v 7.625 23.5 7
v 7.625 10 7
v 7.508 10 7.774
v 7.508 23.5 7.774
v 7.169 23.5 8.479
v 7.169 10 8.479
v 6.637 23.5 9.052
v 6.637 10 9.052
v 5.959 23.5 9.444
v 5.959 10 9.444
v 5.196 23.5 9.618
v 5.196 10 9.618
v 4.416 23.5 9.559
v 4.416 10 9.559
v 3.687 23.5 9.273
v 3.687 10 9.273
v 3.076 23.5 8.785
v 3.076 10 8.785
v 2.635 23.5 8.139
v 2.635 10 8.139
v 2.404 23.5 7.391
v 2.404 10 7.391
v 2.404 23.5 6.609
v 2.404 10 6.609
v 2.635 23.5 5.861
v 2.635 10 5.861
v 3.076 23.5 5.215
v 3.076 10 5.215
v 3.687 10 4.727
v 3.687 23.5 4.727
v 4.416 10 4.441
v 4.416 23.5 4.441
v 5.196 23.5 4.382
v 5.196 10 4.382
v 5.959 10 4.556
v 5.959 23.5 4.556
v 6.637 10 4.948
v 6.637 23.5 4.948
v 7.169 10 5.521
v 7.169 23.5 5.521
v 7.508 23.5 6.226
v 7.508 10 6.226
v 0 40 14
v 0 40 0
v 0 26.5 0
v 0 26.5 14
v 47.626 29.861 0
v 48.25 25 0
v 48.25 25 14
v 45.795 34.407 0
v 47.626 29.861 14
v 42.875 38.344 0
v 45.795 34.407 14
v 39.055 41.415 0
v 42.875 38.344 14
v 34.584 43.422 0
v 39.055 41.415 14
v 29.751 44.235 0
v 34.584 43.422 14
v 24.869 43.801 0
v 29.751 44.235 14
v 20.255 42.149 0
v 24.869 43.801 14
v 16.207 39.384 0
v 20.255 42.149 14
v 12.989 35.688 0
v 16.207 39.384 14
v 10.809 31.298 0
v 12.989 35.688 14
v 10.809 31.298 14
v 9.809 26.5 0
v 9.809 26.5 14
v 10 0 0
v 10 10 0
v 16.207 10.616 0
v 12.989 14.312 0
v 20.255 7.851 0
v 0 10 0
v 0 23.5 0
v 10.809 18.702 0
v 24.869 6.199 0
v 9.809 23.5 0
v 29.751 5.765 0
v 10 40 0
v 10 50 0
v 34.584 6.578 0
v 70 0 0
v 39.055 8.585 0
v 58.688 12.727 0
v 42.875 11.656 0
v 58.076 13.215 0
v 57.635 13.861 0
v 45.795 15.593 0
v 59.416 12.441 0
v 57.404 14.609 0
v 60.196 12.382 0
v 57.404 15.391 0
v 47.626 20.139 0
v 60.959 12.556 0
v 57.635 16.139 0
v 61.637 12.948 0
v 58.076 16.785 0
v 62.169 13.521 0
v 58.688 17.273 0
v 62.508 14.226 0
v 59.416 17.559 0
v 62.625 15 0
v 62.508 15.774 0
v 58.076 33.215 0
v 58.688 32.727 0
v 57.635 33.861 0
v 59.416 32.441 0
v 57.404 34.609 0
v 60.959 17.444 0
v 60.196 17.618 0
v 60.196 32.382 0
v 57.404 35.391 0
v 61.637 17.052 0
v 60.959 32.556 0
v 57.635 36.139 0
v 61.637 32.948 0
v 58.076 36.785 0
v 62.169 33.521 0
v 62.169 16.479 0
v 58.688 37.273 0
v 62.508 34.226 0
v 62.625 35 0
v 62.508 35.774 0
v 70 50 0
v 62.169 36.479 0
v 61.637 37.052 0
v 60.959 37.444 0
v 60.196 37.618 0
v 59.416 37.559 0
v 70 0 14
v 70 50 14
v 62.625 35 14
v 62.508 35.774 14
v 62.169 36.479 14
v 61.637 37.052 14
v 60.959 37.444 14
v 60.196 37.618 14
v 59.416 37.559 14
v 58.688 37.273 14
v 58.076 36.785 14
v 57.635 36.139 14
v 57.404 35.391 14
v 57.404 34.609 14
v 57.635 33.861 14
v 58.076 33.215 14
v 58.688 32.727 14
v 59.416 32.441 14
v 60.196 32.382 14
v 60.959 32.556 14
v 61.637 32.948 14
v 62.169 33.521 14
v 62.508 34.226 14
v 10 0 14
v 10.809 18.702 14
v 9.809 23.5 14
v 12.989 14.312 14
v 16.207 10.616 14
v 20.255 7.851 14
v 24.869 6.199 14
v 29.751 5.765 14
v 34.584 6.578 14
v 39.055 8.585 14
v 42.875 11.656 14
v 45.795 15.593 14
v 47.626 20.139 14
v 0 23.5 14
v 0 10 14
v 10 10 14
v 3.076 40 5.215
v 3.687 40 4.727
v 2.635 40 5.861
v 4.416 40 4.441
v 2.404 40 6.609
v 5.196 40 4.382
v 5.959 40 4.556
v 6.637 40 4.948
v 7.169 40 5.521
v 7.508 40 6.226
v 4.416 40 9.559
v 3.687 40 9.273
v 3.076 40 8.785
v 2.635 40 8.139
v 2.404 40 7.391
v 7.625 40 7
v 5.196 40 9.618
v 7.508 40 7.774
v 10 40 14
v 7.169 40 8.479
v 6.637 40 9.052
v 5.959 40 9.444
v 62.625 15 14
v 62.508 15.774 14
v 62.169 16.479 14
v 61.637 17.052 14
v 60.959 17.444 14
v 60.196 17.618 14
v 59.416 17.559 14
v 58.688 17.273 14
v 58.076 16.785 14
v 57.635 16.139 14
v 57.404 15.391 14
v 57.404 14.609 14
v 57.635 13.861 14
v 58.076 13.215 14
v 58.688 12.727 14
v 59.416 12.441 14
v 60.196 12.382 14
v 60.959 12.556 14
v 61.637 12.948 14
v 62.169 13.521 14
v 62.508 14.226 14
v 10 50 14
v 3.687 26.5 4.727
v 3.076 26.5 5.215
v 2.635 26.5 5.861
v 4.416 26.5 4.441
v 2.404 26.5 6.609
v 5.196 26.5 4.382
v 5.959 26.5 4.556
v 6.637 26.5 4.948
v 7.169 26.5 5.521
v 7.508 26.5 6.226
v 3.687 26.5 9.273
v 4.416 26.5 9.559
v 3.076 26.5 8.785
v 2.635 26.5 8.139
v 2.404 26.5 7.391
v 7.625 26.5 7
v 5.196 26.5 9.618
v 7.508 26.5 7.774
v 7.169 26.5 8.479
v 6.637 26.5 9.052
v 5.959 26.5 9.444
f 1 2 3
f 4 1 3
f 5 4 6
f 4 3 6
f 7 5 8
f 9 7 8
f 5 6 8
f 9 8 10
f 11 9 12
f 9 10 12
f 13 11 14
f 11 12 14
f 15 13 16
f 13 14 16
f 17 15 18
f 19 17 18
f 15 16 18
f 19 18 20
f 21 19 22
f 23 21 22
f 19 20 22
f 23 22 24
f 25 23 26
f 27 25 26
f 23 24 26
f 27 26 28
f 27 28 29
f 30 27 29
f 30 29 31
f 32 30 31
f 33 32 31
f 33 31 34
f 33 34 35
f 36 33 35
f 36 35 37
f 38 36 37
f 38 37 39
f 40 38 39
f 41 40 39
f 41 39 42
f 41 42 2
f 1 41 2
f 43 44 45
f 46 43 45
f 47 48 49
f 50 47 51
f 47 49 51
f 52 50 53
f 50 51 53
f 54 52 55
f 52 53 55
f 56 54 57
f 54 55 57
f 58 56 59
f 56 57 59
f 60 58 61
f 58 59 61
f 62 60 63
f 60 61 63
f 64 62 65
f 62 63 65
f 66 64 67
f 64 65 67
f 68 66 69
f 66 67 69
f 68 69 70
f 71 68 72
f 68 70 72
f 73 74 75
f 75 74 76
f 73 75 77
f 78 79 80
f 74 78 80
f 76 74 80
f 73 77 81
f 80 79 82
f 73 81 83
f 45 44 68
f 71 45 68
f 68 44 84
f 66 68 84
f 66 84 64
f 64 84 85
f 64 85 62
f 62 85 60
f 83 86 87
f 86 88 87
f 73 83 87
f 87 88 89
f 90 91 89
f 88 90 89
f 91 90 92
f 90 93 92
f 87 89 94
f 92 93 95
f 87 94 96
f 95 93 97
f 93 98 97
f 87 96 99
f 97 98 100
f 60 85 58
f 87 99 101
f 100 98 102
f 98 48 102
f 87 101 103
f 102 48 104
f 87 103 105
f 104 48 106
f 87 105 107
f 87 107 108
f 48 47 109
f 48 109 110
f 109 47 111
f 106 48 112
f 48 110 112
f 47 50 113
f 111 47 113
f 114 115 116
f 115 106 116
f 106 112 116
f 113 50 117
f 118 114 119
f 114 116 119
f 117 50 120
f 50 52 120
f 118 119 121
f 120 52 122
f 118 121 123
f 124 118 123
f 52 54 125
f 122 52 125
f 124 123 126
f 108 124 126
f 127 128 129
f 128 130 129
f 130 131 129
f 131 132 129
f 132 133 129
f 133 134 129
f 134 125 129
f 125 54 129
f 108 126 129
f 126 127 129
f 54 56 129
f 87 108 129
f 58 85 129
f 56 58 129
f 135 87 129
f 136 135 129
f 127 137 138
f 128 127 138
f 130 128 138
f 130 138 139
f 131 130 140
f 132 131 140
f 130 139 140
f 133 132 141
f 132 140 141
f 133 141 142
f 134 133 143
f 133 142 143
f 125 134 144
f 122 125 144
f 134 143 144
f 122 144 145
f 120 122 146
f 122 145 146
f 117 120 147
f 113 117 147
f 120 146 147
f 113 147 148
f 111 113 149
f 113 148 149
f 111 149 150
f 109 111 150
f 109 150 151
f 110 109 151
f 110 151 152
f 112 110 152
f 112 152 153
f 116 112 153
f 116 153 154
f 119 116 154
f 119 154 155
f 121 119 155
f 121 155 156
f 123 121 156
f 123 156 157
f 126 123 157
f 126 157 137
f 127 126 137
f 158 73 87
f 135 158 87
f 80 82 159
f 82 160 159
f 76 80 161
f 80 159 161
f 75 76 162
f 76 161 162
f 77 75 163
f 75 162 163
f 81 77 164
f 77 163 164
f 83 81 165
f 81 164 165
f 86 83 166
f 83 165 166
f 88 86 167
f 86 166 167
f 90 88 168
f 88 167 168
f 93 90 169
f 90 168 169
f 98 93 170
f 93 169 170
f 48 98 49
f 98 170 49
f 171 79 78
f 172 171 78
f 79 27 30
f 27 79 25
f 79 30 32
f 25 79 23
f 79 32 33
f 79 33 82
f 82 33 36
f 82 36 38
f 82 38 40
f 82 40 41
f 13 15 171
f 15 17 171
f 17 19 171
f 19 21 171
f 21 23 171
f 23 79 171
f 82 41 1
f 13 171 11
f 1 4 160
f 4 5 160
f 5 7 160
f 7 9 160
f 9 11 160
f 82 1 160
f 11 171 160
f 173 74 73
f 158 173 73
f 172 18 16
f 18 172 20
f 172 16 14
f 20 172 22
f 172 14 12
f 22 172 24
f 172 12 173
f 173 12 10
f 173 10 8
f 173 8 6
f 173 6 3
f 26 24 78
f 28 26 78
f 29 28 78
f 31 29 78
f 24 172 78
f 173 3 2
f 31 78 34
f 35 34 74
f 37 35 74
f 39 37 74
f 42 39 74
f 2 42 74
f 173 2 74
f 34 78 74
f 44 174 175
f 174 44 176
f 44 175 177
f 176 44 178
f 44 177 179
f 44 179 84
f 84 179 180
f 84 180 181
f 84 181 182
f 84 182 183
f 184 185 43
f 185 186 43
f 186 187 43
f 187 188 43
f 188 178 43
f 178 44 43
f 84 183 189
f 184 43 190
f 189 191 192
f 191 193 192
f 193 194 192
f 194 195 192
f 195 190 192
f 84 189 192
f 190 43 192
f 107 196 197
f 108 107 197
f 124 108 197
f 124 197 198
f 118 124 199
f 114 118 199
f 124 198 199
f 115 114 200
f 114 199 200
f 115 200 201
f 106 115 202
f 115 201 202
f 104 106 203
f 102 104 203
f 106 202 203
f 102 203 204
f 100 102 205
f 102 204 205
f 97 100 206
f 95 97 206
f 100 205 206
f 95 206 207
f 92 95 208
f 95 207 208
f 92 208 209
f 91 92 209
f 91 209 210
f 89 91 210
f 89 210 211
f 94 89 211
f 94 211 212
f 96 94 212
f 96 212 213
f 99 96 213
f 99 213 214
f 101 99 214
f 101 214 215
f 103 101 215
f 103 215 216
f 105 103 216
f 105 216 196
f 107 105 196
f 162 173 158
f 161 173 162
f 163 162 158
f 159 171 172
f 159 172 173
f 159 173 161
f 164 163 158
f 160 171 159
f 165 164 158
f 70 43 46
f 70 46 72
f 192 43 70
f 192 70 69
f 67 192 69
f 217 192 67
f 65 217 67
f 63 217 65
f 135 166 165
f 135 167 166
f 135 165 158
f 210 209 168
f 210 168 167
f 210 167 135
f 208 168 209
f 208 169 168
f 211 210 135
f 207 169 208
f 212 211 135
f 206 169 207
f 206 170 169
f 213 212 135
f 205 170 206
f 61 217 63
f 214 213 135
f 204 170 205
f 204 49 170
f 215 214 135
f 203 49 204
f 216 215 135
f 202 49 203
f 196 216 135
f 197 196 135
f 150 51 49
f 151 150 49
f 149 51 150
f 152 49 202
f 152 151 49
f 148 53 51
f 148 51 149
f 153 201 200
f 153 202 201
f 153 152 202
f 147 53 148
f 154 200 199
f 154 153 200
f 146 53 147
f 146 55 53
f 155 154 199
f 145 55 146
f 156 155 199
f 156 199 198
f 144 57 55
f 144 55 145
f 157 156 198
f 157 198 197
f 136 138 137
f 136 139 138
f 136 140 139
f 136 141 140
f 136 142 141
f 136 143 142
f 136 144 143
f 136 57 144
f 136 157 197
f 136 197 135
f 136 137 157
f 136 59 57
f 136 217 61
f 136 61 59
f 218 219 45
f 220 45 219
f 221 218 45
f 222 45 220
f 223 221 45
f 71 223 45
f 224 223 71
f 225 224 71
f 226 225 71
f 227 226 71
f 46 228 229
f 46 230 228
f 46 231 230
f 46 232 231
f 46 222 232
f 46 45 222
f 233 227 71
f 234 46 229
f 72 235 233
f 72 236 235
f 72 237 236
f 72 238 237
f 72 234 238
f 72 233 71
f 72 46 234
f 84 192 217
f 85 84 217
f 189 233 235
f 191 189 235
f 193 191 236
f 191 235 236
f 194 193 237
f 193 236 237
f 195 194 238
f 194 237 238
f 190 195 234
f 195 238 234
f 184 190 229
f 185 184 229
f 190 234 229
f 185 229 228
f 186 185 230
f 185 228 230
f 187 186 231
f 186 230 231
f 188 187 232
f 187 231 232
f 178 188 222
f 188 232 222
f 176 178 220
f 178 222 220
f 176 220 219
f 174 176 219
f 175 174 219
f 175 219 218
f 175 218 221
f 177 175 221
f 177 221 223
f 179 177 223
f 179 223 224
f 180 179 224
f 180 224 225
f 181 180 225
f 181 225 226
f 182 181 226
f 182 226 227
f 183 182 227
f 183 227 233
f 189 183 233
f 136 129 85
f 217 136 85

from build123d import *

# Parameters (mm, degrees)
F1_DEPTH = 14
F2_R     = 19.25
F2_R_2   = 2.625
F2_W     = 10
F2_H     = 10
F3_DEPTH = 25
F4_W     = 13.615144
F4_H     = 3
F5_DEPTH = 25
F6_R     = 2.625
F7_DEPTH = 40.001


with BuildPart() as f1:
    # F0 (on Top) → F1 (new body)
    with BuildSketch(Plane.XY):
        Polygon((10, 10), (10, 0), (70, 0), (70, 50), (0, 50), (0, 10), align=None)
    extrude(amount=F1_DEPTH)

    # F2 (on face) → F3 (cut)
    with BuildSketch(Plane.XY.offset(14)):
        with Locations((29, 25)):
            Circle(F2_R)
        with Locations((60, 35)):
            Circle(F2_R_2)
        with Locations((60, 15)):
            Circle(F2_R_2)
        with Locations((5, 45)):
            Rectangle(F2_W, F2_H)
    extrude(amount=-F3_DEPTH, mode=Mode.SUBTRACT)

    # F4 (on face) → F5 (cut)
    with BuildSketch(Plane.XY.offset(14)):
        with Locations((6.807572, 25)):
            Rectangle(F4_W, F4_H)
    extrude(amount=-F5_DEPTH, mode=Mode.SUBTRACT)

    # F6 (on face) → F7 (cut, through all)
    with BuildSketch(Plane.XZ.offset(-10)):
        with Locations((5, 7)):
            Circle(F6_R)
    extrude(amount=-F7_DEPTH, mode=Mode.SUBTRACT)


solid = f1.part
